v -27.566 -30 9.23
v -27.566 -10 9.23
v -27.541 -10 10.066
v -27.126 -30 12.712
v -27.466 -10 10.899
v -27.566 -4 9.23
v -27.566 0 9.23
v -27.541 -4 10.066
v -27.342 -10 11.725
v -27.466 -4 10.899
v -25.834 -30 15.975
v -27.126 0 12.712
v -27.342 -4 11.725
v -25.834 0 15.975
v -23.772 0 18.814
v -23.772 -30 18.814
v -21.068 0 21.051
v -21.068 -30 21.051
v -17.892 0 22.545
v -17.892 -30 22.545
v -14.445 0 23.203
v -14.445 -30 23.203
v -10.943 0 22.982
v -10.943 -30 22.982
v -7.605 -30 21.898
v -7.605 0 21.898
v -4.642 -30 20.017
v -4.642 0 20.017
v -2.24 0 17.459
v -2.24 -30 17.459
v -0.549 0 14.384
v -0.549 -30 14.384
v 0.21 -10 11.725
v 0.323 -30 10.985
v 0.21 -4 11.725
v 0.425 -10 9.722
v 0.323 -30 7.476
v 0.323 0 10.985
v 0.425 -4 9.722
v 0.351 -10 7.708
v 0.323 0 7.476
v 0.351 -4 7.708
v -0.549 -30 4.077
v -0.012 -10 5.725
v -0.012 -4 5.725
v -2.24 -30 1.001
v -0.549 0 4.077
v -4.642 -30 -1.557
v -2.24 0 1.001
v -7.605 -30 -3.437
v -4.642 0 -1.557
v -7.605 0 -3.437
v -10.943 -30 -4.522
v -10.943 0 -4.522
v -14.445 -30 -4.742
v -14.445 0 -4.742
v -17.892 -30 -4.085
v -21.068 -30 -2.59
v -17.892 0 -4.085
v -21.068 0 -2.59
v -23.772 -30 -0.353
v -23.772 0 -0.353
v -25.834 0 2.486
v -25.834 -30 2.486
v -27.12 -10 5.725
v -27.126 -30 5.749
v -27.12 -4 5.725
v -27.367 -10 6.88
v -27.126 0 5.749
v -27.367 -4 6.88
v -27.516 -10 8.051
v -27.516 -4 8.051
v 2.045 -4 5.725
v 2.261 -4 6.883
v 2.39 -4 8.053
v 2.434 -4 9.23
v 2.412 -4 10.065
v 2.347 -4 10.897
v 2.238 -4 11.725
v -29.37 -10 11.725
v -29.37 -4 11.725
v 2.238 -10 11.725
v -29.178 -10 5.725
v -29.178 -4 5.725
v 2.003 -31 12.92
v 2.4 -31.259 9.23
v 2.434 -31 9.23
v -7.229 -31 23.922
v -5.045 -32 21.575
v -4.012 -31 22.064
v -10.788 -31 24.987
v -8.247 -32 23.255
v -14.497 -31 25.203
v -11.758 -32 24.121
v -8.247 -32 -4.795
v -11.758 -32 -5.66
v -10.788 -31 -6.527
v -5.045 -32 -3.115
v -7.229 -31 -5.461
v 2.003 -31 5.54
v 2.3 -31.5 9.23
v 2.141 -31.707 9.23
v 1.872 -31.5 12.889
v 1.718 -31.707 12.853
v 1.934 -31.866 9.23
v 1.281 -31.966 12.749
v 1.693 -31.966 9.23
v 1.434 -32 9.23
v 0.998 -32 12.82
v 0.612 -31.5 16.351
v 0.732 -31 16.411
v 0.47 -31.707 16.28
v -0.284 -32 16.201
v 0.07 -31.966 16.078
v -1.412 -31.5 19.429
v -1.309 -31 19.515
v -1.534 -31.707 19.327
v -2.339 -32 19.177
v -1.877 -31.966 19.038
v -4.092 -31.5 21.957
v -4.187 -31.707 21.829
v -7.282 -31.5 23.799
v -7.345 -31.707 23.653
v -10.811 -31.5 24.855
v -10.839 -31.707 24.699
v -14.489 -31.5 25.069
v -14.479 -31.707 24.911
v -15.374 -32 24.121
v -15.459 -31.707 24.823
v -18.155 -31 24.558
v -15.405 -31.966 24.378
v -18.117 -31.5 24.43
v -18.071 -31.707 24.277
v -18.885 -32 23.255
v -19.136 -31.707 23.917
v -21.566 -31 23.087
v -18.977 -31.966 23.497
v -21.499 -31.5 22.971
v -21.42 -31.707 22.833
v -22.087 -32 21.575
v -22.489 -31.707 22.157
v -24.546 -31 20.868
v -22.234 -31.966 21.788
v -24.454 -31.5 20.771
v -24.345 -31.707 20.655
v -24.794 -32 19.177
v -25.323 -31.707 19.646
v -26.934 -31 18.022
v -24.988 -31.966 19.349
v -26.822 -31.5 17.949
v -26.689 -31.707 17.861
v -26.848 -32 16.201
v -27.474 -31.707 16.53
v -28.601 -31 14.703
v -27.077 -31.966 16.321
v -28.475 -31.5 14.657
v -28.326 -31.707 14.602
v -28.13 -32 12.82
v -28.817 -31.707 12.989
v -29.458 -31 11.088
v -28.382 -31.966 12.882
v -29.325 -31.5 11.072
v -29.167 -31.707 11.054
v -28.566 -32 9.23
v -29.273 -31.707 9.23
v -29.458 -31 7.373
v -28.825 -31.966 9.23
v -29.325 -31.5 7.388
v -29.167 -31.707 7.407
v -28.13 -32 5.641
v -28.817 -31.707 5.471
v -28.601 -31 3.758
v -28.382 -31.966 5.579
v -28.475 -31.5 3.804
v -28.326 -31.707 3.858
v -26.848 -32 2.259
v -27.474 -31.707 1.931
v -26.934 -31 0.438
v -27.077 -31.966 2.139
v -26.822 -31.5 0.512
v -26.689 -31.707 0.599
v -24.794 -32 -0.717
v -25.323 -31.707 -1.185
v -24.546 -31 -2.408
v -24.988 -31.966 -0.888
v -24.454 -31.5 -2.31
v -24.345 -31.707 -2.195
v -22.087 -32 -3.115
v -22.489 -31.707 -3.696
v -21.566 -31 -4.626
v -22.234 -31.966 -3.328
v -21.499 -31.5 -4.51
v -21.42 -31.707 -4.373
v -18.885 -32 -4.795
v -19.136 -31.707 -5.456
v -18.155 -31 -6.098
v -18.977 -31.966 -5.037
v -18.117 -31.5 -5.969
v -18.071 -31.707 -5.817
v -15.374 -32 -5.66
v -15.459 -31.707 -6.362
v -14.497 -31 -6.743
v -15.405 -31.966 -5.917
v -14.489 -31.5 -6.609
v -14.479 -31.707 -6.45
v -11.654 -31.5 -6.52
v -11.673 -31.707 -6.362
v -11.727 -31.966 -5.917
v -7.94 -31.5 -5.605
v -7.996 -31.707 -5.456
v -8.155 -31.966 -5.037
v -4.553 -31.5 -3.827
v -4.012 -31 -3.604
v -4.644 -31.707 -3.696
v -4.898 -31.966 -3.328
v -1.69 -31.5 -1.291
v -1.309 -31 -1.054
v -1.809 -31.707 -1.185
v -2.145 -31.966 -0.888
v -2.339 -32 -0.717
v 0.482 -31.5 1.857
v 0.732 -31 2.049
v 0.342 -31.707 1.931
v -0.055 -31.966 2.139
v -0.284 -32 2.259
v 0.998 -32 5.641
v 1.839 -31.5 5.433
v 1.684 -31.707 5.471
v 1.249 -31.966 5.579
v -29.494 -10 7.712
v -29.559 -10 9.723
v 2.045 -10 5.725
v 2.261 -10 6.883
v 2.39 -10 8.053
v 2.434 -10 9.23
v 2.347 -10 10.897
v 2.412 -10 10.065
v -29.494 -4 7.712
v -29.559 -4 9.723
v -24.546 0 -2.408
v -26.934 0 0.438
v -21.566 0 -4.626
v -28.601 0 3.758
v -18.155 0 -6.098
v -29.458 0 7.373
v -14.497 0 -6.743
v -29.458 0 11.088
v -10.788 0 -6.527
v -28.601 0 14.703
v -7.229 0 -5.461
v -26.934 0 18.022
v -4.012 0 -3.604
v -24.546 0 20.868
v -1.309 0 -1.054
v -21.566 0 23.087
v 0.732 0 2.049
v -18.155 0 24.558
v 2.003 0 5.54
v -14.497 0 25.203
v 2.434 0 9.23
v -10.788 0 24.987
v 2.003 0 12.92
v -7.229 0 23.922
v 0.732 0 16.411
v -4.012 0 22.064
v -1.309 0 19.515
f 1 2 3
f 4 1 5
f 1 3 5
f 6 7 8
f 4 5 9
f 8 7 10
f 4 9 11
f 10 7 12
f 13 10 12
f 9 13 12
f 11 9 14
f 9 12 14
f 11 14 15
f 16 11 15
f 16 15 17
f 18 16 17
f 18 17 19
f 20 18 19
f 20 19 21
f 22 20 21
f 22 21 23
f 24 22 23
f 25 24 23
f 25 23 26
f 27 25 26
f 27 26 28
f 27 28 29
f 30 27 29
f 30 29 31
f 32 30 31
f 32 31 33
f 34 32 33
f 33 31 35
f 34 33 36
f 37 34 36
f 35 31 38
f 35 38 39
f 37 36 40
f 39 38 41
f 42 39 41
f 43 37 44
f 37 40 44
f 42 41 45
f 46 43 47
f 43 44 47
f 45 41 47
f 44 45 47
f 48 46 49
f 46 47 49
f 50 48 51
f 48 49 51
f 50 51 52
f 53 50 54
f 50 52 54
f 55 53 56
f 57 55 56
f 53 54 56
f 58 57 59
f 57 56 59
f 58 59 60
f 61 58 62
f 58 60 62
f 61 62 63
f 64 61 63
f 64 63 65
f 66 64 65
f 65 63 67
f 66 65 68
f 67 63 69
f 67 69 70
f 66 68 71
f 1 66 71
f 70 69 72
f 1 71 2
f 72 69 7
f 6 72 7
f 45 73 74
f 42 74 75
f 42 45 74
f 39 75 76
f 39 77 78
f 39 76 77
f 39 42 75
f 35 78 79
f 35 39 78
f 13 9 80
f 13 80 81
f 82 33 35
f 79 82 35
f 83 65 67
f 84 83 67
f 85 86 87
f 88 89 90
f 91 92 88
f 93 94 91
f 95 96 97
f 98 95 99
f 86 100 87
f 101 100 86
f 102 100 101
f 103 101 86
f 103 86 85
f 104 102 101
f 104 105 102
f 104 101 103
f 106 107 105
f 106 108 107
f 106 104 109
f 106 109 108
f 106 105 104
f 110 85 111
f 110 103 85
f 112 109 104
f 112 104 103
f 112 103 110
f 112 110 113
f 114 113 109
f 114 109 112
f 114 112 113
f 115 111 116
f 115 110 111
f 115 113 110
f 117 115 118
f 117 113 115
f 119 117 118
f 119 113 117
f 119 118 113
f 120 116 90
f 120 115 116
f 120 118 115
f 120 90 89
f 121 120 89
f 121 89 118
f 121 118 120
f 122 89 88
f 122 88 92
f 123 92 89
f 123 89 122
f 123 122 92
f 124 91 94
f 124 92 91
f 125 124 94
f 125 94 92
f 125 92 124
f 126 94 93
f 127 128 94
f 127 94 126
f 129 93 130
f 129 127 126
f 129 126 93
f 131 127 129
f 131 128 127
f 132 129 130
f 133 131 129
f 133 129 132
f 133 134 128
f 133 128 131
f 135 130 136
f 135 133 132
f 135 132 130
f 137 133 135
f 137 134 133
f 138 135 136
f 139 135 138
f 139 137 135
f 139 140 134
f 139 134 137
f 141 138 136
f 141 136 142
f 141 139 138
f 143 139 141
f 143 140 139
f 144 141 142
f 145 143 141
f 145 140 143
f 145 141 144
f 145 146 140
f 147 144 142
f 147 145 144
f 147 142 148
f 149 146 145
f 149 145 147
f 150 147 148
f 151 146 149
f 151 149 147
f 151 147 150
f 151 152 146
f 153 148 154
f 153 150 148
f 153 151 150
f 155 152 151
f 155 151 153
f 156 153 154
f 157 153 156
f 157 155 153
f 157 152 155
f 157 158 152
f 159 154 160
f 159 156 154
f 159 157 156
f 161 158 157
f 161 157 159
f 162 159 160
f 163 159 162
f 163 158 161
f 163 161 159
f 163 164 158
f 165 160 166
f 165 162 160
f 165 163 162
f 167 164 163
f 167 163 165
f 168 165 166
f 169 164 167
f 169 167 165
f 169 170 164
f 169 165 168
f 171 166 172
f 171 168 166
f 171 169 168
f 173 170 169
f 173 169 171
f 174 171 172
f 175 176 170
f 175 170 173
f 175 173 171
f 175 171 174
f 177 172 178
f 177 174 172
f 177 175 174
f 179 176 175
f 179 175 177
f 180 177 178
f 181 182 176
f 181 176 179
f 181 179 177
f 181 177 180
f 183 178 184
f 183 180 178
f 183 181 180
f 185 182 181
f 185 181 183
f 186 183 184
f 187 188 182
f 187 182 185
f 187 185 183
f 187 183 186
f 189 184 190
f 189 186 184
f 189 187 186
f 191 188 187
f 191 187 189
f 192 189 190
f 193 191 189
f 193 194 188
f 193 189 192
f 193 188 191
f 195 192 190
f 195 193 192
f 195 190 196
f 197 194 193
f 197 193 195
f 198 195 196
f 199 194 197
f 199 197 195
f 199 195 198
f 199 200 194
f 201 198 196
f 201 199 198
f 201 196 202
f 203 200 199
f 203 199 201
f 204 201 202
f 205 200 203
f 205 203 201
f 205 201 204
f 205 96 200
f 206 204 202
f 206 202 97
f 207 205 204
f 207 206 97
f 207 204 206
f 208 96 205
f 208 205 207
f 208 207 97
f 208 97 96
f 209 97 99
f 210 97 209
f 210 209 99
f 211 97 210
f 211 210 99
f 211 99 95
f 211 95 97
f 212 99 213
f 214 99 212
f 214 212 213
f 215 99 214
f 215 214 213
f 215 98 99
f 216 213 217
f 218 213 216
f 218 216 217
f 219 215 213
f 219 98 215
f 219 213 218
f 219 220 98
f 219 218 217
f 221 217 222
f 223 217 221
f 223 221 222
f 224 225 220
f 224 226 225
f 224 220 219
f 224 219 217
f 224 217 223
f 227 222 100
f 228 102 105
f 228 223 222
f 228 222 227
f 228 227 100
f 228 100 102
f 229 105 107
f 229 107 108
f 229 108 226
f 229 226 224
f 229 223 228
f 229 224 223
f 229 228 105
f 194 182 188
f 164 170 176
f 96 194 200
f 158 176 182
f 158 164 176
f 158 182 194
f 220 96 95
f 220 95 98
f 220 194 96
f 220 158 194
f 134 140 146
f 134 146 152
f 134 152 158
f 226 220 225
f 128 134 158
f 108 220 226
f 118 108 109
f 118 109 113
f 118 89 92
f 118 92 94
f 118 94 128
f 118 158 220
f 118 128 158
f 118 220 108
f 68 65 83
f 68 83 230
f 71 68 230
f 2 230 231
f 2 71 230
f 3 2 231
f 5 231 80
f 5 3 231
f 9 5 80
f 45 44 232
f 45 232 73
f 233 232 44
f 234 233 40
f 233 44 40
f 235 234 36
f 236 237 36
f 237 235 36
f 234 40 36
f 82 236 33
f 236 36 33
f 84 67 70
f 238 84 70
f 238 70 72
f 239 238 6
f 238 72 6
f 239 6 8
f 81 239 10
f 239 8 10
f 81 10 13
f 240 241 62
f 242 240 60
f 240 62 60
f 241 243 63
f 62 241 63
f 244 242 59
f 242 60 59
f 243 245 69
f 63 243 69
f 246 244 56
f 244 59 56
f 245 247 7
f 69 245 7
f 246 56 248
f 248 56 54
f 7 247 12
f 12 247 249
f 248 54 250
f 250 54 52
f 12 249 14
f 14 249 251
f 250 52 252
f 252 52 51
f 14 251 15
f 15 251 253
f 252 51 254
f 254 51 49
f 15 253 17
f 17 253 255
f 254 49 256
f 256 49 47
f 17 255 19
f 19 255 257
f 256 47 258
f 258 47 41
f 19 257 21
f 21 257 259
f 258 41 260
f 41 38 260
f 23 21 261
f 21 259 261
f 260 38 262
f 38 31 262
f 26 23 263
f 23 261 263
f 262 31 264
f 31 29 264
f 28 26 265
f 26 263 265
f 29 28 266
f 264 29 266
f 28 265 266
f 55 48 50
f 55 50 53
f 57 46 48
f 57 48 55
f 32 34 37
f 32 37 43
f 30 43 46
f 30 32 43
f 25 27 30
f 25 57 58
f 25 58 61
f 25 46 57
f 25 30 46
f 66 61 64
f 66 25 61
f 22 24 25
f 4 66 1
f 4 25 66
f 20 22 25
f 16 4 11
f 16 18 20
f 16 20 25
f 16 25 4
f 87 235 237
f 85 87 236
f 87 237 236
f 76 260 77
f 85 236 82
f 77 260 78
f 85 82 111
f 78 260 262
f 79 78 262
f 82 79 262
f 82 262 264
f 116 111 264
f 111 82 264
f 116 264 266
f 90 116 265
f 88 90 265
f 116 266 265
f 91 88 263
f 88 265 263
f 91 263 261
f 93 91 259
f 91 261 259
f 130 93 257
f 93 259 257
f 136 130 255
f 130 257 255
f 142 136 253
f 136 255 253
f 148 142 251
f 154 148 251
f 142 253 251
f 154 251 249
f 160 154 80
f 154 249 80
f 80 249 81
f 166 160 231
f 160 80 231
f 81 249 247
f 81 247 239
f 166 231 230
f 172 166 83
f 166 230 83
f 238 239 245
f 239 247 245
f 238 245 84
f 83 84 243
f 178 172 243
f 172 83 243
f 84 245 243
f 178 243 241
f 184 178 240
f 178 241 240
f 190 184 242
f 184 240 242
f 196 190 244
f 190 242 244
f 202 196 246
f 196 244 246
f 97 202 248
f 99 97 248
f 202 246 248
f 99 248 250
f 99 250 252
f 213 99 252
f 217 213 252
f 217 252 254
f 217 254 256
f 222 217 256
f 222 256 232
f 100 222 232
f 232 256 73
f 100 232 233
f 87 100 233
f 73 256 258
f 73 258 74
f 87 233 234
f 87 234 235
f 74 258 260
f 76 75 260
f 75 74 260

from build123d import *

# Parameters (mm, degrees)
F0_R          = 16
F0_R_2        = 14
F1_DEPTH      = 32
F2_R          = 14
F3_DEPTH      = 30
F4_R          = 1
F5_W          = 6
F5_H          = 6
F6_DEPTH      = 35.5
F6_DEPTH_BACK = 16.5


# Not quite as in the source:
# - a feature names something its author has since deleted; it is built from what else it names


with BuildPart() as f1:
    # F0 (on Front) → F1 (new body)
    with BuildSketch(Plane.XZ):
        with Locations((-13.5661968961, 9.2302449048)):
            Circle(F0_R)
        with Locations((-13.5661968961, 9.2302449048)):
            Circle(F0_R_2, mode=Mode.SUBTRACT)
        with Locations((-13.5661968961, 9.2302449048)):
            Circle(F0_R_2)
    extrude(amount=F1_DEPTH)

    # F2 (on face) → F3 (cut)
    with BuildSketch(Plane(origin=(0, 0, 0), x_dir=(-1, 0, 0), z_dir=(0, 1, 0))):
        with Locations((13.5661968961, 9.2302449048)):
            Circle(F2_R)
    extrude(amount=-F3_DEPTH, mode=Mode.SUBTRACT)

    # F4
    f4_edges = [f1.edges().sort_by_distance(p)[0] for p in [
        (-29.566197, -32, 9.230245),
    ]]
    fillet(f4_edges, radius=F4_R)

    # F5 (on Right) → F6 (cut, two sides)
    with BuildSketch(Plane.YZ) as f6_sk:
        with Locations((-7, 8.7253677193)):
            Rectangle(F5_W, F5_H)
    extrude(amount=-F6_DEPTH, mode=Mode.SUBTRACT)
    extrude(f6_sk.sketch, amount=F6_DEPTH_BACK, mode=Mode.SUBTRACT)


solid = f1.part
